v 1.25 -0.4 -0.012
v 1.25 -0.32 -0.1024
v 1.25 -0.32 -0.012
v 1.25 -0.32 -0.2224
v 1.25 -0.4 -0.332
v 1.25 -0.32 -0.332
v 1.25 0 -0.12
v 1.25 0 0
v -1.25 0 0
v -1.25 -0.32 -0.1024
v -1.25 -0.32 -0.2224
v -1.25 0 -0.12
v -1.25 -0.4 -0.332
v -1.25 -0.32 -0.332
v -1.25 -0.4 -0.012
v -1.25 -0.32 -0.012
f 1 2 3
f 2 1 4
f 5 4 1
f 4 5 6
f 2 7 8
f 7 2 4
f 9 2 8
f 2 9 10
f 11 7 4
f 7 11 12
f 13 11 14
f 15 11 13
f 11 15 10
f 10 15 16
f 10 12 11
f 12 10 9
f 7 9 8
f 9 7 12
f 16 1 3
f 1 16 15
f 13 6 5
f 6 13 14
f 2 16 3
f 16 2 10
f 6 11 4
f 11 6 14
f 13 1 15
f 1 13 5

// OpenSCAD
// Shed shell kit: eave. See lib/lodge_kit.scad.
include <lib/lodge_kit.scad>
kind = "shed";
eave();
